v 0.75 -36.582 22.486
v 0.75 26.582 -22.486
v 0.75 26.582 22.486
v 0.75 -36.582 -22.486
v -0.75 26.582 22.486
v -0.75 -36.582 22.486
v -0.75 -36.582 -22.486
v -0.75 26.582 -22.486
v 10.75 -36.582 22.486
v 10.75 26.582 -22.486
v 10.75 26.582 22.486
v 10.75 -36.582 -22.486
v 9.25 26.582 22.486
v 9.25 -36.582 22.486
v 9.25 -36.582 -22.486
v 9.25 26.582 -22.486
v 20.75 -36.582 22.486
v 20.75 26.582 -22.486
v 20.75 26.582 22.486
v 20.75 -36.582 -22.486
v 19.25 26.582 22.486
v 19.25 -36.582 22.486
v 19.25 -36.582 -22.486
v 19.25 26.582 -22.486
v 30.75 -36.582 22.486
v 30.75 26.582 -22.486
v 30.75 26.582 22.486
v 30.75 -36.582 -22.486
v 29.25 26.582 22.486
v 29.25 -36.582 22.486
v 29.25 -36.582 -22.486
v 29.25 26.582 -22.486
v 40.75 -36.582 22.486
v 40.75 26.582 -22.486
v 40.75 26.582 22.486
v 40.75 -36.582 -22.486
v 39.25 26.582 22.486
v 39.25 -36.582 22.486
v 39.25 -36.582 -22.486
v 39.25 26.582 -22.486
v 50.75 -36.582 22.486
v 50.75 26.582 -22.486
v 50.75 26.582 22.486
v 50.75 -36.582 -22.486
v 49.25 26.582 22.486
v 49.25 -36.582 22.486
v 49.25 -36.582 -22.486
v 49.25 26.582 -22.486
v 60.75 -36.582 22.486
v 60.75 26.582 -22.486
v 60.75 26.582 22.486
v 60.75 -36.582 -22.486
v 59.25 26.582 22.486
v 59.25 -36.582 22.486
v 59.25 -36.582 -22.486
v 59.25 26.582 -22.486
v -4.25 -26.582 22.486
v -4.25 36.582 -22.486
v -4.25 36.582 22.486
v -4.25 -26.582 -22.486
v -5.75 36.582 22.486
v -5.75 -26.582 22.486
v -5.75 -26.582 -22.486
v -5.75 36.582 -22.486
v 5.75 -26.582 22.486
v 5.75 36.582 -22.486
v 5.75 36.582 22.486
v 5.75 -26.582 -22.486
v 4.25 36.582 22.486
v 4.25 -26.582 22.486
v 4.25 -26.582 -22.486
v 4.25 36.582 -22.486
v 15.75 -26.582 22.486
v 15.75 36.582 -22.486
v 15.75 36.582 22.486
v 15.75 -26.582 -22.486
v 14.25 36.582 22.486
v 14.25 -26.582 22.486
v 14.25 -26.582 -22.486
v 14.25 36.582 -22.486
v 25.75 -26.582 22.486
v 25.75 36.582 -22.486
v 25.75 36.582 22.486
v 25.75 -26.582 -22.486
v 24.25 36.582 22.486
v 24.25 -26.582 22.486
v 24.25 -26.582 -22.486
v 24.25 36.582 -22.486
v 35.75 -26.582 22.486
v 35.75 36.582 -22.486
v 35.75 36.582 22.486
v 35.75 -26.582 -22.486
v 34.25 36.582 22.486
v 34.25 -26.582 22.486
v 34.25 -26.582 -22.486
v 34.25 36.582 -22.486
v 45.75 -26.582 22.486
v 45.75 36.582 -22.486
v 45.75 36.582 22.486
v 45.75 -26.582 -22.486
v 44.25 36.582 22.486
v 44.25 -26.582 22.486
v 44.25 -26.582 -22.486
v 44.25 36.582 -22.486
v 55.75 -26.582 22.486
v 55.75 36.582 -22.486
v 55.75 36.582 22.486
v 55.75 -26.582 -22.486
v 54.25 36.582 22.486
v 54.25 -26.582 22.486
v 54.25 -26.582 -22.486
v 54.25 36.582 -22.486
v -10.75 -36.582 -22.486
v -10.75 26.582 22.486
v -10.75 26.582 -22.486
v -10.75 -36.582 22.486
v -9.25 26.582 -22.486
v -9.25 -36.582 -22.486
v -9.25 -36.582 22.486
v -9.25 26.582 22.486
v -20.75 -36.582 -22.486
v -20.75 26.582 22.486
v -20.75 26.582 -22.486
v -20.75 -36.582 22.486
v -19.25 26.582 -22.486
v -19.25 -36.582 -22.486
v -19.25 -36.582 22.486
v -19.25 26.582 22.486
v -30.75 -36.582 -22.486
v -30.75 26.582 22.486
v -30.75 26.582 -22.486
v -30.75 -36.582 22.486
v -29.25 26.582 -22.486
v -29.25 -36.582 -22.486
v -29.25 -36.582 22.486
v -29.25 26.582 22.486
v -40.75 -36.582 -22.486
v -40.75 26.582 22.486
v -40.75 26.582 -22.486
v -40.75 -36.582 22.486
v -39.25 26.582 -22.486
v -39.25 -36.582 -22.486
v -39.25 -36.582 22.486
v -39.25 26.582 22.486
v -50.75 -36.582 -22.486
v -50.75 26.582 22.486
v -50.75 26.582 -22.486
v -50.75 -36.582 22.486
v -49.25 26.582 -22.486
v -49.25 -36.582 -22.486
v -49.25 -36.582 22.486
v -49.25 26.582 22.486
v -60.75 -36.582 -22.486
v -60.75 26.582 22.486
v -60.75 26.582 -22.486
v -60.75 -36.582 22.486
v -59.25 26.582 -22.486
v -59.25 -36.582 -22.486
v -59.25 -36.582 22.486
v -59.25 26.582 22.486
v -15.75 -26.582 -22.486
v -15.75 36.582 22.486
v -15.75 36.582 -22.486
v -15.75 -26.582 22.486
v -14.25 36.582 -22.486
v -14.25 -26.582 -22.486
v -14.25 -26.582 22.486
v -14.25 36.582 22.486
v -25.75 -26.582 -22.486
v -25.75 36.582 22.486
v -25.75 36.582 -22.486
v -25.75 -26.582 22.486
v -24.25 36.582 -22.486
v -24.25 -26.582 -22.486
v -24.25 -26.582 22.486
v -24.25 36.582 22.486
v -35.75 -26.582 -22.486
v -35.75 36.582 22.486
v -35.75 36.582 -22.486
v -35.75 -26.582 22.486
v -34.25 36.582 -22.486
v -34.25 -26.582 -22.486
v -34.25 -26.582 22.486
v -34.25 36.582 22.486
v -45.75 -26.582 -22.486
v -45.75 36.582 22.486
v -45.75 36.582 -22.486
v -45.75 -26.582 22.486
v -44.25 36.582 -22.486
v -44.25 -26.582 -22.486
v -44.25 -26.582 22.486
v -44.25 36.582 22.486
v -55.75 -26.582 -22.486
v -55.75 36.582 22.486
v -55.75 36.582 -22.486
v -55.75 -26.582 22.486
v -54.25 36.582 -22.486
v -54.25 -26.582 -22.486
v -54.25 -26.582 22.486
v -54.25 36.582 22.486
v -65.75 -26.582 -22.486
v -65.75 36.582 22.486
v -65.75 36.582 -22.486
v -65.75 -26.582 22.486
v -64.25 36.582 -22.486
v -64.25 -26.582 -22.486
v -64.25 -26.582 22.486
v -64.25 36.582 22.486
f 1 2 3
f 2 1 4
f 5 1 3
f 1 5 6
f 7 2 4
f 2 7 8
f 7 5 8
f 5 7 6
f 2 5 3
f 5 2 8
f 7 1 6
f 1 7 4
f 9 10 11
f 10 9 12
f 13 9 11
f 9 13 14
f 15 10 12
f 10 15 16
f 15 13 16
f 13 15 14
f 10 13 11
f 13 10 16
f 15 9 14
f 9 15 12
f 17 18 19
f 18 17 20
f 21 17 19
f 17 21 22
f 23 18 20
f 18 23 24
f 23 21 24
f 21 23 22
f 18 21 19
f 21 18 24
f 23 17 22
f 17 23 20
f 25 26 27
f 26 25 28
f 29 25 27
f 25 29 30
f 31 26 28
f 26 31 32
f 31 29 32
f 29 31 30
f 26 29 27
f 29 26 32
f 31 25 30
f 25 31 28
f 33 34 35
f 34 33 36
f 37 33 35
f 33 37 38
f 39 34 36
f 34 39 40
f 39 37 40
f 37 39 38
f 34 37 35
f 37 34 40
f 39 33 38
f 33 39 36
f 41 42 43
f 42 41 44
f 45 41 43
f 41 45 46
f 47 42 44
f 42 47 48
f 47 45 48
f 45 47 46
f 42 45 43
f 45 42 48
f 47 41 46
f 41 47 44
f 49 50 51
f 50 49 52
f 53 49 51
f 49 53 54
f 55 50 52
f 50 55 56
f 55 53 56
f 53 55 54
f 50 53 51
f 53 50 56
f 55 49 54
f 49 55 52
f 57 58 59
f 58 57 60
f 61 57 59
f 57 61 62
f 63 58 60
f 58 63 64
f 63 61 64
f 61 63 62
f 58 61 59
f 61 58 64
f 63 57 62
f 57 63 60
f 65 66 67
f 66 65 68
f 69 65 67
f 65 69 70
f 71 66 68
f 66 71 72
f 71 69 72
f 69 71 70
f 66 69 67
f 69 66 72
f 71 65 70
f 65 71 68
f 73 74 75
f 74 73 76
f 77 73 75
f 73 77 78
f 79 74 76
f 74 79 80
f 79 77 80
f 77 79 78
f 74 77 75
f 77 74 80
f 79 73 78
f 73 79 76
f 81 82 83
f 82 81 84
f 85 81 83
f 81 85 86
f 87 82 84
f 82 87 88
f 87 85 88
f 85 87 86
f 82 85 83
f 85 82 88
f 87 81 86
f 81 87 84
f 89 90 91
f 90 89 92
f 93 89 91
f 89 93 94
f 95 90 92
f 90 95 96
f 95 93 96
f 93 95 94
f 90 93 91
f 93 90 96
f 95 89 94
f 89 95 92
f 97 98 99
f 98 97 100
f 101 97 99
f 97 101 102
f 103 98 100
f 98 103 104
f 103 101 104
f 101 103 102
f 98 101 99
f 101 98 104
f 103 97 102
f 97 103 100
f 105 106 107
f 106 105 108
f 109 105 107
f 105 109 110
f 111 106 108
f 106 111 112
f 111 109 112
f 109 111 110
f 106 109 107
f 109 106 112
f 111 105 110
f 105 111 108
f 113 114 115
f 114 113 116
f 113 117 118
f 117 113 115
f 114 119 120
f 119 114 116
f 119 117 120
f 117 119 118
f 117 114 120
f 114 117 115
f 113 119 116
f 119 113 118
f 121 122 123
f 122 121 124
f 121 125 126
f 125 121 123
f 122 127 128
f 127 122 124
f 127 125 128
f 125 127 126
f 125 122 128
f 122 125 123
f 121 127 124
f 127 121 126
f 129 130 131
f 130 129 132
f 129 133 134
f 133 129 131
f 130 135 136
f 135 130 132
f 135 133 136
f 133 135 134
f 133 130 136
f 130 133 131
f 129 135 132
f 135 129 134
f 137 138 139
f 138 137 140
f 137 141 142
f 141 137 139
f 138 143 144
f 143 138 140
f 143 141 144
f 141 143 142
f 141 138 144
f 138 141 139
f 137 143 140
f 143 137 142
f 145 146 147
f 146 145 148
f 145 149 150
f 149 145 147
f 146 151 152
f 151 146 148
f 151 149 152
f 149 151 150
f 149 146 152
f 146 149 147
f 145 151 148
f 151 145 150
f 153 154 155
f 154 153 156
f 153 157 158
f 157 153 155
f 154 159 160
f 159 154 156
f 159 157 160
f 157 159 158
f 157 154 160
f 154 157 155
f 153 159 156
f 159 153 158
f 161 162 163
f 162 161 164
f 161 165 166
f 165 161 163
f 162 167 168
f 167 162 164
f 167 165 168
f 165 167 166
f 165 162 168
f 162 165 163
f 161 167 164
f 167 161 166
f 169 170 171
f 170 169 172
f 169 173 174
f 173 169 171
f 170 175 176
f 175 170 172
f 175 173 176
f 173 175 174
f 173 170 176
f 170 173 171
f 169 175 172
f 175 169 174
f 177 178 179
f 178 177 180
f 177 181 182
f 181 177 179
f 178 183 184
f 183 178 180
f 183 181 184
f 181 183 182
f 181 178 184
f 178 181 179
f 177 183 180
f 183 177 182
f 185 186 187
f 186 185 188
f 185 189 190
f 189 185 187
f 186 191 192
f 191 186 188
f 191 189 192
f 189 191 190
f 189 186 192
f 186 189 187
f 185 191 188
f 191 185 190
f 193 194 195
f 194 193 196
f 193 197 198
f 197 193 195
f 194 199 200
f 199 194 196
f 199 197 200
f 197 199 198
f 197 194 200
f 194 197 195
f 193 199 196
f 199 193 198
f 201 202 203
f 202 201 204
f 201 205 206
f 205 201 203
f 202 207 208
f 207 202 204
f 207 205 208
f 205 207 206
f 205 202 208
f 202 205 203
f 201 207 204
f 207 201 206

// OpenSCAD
// file: 3dprinter.scad
//===============================================//
//===============================================//
//     BioDeploy SCAD file = 3dprinter.scad      //
//                 Start File                    //
//===============================================//
//===============================================//
//choose the max specs for your 3d printer
//here we use a replicator2x specs
x_print_max = 24.6*10;
y_print_max = 15.2*10;
z_print_max = 15.5*10;
//don't forget *10 to put unit in centimeters
//-----------------------------------------------//
//===============================================//
//===============================================//
//     BioDeploy SCAD file = 3dprinter.scad      //
//                   End  File                   //
//===============================================//
//===============================================//
// main file
//===============================================//
//===============================================//
//BioDeploy SCAD file = hydrolyseur_top_core_plates.scad//
//                 Start File                    //
//===============================================//
//===============================================//
//-----------------------------------------------//
//===============================================//
include <3dprinter.scad>
//===============================================//
//                 variables                     //
//===============================================//
include <hydrolyseur_variables.scad>



module number1()
{

for (i_x = [0:core_plate_number/4]) 
{
translate([i_x*10,0,0]) cube([x_core_plate_size,y_h2o_top_core_plate+3,z_h2o_top_core_plate],center = true);
}
}

module number2()
{

for (i_x = [0:core_plate_number/4]) 
{
translate([i_x*10,0,0]) cube([x_core_plate_size,y_h2o_top_core_plate+3,z_h2o_top_core_plate],center = true);
}
}


translate([0,-5,0]) number1();
translate([-5,5,0]) number2();

rotate([0,180,0])translate([0,-5,0]) number1();
rotate([0,180,0])translate([+5,+5,0]) number2();


//-----------------------------------------------//
//===============================================//
//===============================================//
//BioDeploy SCAD file = hydrolyseur_top_core_plates.scad//
//                    End File                   //
//===============================================//
//===============================================//
